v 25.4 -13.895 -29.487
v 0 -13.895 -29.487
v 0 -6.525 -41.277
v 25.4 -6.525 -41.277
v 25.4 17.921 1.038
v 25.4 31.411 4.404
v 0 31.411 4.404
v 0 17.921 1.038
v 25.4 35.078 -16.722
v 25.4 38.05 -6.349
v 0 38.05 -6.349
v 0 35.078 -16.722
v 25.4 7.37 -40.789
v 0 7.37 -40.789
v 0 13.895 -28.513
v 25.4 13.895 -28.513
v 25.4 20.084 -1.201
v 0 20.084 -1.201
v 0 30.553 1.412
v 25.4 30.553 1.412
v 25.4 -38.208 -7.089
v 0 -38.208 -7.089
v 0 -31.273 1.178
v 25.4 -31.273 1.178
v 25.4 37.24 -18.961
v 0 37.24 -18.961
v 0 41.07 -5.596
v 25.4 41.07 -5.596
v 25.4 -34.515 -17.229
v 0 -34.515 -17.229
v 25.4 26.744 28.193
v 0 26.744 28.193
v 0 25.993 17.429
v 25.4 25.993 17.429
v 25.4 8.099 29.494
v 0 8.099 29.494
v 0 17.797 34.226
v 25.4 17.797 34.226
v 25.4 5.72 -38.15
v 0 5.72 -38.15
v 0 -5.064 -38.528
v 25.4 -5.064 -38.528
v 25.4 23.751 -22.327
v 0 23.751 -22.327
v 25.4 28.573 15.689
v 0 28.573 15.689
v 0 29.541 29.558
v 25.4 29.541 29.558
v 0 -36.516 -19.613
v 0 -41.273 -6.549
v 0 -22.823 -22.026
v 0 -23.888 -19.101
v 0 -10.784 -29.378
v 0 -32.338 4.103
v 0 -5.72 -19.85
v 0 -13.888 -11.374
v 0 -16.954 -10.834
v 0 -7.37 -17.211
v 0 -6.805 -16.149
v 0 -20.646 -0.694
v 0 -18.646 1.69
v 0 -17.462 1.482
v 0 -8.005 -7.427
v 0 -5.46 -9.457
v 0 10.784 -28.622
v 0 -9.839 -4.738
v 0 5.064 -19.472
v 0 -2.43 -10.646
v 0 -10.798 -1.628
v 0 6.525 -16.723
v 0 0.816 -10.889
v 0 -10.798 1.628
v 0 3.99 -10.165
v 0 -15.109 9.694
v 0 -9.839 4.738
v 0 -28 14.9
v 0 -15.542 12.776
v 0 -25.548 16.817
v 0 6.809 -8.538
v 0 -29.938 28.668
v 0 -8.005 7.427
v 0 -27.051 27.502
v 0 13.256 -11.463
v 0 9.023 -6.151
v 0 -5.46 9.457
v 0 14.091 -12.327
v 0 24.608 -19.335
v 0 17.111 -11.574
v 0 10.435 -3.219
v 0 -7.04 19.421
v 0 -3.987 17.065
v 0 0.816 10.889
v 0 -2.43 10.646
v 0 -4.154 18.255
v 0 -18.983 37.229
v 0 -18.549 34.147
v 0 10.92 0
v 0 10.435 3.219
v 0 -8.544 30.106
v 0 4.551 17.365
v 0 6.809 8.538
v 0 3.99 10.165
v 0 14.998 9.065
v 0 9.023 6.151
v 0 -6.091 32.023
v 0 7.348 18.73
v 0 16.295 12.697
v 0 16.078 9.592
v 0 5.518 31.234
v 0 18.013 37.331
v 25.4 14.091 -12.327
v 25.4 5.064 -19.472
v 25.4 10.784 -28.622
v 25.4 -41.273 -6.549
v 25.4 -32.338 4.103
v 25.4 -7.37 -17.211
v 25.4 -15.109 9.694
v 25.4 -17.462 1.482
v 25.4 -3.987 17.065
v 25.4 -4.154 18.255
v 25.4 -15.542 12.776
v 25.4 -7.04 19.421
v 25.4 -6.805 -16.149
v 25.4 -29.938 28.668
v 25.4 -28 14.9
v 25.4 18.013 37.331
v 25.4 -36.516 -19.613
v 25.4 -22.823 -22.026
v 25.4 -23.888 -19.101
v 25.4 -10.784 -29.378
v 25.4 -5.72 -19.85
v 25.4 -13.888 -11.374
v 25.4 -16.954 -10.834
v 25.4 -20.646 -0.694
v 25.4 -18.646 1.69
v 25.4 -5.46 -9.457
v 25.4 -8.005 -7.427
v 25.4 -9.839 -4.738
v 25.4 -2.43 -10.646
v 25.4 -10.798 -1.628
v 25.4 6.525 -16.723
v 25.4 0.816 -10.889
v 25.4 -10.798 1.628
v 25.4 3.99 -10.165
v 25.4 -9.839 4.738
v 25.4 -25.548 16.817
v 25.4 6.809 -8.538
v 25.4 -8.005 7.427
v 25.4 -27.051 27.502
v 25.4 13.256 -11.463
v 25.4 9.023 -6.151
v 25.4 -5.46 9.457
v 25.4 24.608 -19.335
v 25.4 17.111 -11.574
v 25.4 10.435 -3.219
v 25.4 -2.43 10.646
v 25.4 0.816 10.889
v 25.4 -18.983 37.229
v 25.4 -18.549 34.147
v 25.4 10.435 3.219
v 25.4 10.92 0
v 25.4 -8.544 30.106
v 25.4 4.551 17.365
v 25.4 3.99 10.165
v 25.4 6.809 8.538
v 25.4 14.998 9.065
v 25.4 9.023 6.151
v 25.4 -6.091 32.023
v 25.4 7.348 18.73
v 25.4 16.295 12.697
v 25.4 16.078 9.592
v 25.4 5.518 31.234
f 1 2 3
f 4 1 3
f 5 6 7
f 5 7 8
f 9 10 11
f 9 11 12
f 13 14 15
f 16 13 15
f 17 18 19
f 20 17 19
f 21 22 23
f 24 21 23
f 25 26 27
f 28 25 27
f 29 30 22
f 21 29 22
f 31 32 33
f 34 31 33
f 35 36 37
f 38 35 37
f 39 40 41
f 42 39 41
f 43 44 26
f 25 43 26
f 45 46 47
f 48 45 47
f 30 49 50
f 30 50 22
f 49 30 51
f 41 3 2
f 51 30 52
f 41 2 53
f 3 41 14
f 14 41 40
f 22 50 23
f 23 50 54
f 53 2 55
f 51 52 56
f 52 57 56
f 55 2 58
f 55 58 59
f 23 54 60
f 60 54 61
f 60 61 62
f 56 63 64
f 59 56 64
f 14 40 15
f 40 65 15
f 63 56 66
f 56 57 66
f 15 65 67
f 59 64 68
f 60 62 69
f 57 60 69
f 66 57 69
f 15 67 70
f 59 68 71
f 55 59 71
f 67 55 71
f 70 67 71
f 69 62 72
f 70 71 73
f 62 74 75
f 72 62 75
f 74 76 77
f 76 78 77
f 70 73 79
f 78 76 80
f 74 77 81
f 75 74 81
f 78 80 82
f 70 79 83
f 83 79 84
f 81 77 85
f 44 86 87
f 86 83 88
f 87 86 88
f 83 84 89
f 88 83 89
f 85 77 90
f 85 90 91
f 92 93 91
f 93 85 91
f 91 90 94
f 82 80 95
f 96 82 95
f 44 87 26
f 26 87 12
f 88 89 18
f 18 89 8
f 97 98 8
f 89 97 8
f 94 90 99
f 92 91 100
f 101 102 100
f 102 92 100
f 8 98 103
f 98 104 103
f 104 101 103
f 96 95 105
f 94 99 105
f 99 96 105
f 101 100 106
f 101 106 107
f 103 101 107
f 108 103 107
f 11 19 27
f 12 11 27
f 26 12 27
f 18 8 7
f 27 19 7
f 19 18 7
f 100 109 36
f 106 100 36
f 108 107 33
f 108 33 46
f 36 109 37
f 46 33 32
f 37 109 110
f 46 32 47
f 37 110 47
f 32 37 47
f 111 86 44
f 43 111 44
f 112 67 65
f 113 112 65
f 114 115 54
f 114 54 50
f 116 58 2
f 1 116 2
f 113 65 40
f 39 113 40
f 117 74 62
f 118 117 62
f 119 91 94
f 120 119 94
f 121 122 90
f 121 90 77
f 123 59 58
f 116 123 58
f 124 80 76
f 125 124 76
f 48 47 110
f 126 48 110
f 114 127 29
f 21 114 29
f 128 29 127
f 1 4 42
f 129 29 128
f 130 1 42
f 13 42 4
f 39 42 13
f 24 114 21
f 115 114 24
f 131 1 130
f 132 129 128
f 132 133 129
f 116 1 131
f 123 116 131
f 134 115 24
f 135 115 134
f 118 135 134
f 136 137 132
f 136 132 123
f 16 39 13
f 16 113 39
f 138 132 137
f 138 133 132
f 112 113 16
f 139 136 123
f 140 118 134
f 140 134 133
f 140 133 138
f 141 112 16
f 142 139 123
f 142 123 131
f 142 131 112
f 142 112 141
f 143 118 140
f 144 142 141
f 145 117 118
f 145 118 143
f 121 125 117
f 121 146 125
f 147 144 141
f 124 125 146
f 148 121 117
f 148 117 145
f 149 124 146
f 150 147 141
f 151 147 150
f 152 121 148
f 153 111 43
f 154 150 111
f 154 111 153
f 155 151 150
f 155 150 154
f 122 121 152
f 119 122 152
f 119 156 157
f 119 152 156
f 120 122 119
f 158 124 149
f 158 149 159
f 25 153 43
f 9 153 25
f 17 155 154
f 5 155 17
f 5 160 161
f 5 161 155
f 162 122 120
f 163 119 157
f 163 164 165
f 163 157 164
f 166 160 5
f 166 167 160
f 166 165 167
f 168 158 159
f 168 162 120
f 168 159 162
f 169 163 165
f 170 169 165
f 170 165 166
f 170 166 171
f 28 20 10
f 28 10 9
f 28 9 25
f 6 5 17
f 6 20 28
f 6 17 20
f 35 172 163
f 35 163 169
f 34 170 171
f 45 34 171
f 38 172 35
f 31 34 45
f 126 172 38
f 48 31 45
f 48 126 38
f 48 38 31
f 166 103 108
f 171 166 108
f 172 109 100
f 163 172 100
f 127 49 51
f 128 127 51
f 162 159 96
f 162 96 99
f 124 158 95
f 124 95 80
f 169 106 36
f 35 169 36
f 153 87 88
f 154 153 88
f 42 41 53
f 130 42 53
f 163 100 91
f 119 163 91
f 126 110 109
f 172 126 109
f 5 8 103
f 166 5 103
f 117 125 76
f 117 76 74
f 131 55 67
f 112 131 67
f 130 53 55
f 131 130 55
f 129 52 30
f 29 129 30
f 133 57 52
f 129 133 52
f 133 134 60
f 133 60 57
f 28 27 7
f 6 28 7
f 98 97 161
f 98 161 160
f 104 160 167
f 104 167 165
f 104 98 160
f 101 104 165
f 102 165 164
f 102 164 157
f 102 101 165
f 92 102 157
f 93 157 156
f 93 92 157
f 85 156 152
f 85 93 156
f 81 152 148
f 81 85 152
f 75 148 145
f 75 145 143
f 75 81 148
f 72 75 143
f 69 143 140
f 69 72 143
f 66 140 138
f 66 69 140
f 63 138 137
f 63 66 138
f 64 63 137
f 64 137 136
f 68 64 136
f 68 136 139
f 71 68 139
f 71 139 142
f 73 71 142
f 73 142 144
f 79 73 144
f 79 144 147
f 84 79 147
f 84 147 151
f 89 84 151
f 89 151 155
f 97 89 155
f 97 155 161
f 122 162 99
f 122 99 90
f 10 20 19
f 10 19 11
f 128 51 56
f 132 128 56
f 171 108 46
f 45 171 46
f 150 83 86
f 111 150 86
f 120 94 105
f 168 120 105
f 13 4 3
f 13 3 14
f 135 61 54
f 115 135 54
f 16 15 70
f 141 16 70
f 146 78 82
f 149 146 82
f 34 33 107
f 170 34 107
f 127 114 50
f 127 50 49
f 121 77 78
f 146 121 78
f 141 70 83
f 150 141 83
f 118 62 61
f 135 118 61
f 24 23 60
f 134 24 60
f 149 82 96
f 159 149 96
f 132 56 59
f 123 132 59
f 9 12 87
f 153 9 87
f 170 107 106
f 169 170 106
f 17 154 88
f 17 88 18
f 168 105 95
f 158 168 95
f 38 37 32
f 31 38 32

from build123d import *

# Parameters (mm, degrees)
F0_R     = 10.92
F1_DEPTH = 25.4
F2_DEPTH = 25


with BuildPart() as f1:
    # F0 (on Right) → F1 (new body)
    with BuildSketch(Plane.YZ):
        Polygon((29.540967, 29.558321), (18.013362, 37.331063), (5.518167, 31.234235), (4.550577, 17.364665), (-3.986563, 17.065152), (-4.154029, 18.255328), (-6.091229, 32.022988), (-18.982973, 37.229153), (-29.937516, 28.667658), (-28.000315, 14.899998), (-15.108572, 9.693833), (-17.46184, 1.481975), (-18.645514, 1.69049), (-32.337964, 4.102544), (-41.27309, -6.549439), (-36.515764, -19.613476), (-22.823314, -22.02553), (-13.888188, -11.373547), (-6.805447, -16.149241), (-7.369532, -17.210547), (-13.894732, -29.487476), (-6.525199, -41.276929), (7.369532, -40.789453), (13.894732, -28.512524), (6.525199, -16.723071), (13.255842, -11.462755), (14.090892, -12.327193), (23.750548, -22.326806), (37.240294, -18.961106), (41.070386, -5.595792), (31.41073, 4.403821), (17.920983, 1.03812), (14.998008, 9.064869), (16.078183, 9.591923), (28.573378, 15.688751), align=None)
        Polygon((-31.272916, 1.177826), (-20.645869, -0.694228), (-16.953593, -10.833547), (-23.888362, -19.100812), (-34.515409, -17.228758), (-38.207685, -7.089439), align=None, mode=Mode.SUBTRACT)
        Polygon((5.064367, -19.471575), (10.784042, -28.621658), (5.719675, -38.150083), (-5.064367, -38.528425), (-10.784042, -29.378342), (-5.719675, -19.849917), align=None, mode=Mode.SUBTRACT)
        Polygon((24.608011, -19.33464), (17.110916, -11.573695), (20.083544, -1.200548), (30.553267, 1.411654), (38.050362, -6.34929), (35.077734, -16.722437), align=None, mode=Mode.SUBTRACT)
        Polygon((-8.543683, 30.106279), (-7.040174, 19.42086), (-15.542264, 12.776075), (-25.547862, 16.816707), (-27.05137, 27.502125), (-18.549281, 34.146911), align=None, mode=Mode.SUBTRACT)
        Circle(F0_R, mode=Mode.SUBTRACT)
        Polygon((25.992629, 17.428877), (16.294802, 12.69698), (7.347945, 18.729595), (8.098915, 29.494108), (17.796742, 34.226006), (26.743599, 28.19339), align=None, mode=Mode.SUBTRACT)
    extrude(amount=F1_DEPTH)

    # F0 (on Right) → F2 (join)
    with BuildSketch(Plane.YZ):
        Polygon((29.540967, 29.558321), (18.013362, 37.331063), (5.518167, 31.234235), (4.550577, 17.364665), (-3.986563, 17.065152), (-4.154029, 18.255328), (-6.091229, 32.022988), (-18.982973, 37.229153), (-29.937516, 28.667658), (-28.000315, 14.899998), (-15.108572, 9.693833), (-17.46184, 1.481975), (-18.645514, 1.69049), (-32.337964, 4.102544), (-41.27309, -6.549439), (-36.515764, -19.613476), (-22.823314, -22.02553), (-13.888188, -11.373547), (-6.805447, -16.149241), (-7.369532, -17.210547), (-13.894732, -29.487476), (-6.525199, -41.276929), (7.369532, -40.789453), (13.894732, -28.512524), (6.525199, -16.723071), (13.255842, -11.462755), (14.090892, -12.327193), (23.750548, -22.326806), (37.240294, -18.961106), (41.070386, -5.595792), (31.41073, 4.403821), (17.920983, 1.03812), (14.998008, 9.064869), (16.078183, 9.591923), (28.573378, 15.688751), align=None)
        Polygon((-31.272916, 1.177826), (-20.645869, -0.694228), (-16.953593, -10.833547), (-23.888362, -19.100812), (-34.515409, -17.228758), (-38.207685, -7.089439), align=None, mode=Mode.SUBTRACT)
        Polygon((5.064367, -19.471575), (10.784042, -28.621658), (5.719675, -38.150083), (-5.064367, -38.528425), (-10.784042, -29.378342), (-5.719675, -19.849917), align=None, mode=Mode.SUBTRACT)
        Polygon((24.608011, -19.33464), (17.110916, -11.573695), (20.083544, -1.200548), (30.553267, 1.411654), (38.050362, -6.34929), (35.077734, -16.722437), align=None, mode=Mode.SUBTRACT)
        Polygon((-8.543683, 30.106279), (-7.040174, 19.42086), (-15.542264, 12.776075), (-25.547862, 16.816707), (-27.05137, 27.502125), (-18.549281, 34.146911), align=None, mode=Mode.SUBTRACT)
        Circle(F0_R, mode=Mode.SUBTRACT)
        Polygon((25.992629, 17.428877), (16.294802, 12.69698), (7.347945, 18.729595), (8.098915, 29.494108), (17.796742, 34.226006), (26.743599, 28.19339), align=None, mode=Mode.SUBTRACT)
    extrude(amount=F2_DEPTH)


solid = f1.part
